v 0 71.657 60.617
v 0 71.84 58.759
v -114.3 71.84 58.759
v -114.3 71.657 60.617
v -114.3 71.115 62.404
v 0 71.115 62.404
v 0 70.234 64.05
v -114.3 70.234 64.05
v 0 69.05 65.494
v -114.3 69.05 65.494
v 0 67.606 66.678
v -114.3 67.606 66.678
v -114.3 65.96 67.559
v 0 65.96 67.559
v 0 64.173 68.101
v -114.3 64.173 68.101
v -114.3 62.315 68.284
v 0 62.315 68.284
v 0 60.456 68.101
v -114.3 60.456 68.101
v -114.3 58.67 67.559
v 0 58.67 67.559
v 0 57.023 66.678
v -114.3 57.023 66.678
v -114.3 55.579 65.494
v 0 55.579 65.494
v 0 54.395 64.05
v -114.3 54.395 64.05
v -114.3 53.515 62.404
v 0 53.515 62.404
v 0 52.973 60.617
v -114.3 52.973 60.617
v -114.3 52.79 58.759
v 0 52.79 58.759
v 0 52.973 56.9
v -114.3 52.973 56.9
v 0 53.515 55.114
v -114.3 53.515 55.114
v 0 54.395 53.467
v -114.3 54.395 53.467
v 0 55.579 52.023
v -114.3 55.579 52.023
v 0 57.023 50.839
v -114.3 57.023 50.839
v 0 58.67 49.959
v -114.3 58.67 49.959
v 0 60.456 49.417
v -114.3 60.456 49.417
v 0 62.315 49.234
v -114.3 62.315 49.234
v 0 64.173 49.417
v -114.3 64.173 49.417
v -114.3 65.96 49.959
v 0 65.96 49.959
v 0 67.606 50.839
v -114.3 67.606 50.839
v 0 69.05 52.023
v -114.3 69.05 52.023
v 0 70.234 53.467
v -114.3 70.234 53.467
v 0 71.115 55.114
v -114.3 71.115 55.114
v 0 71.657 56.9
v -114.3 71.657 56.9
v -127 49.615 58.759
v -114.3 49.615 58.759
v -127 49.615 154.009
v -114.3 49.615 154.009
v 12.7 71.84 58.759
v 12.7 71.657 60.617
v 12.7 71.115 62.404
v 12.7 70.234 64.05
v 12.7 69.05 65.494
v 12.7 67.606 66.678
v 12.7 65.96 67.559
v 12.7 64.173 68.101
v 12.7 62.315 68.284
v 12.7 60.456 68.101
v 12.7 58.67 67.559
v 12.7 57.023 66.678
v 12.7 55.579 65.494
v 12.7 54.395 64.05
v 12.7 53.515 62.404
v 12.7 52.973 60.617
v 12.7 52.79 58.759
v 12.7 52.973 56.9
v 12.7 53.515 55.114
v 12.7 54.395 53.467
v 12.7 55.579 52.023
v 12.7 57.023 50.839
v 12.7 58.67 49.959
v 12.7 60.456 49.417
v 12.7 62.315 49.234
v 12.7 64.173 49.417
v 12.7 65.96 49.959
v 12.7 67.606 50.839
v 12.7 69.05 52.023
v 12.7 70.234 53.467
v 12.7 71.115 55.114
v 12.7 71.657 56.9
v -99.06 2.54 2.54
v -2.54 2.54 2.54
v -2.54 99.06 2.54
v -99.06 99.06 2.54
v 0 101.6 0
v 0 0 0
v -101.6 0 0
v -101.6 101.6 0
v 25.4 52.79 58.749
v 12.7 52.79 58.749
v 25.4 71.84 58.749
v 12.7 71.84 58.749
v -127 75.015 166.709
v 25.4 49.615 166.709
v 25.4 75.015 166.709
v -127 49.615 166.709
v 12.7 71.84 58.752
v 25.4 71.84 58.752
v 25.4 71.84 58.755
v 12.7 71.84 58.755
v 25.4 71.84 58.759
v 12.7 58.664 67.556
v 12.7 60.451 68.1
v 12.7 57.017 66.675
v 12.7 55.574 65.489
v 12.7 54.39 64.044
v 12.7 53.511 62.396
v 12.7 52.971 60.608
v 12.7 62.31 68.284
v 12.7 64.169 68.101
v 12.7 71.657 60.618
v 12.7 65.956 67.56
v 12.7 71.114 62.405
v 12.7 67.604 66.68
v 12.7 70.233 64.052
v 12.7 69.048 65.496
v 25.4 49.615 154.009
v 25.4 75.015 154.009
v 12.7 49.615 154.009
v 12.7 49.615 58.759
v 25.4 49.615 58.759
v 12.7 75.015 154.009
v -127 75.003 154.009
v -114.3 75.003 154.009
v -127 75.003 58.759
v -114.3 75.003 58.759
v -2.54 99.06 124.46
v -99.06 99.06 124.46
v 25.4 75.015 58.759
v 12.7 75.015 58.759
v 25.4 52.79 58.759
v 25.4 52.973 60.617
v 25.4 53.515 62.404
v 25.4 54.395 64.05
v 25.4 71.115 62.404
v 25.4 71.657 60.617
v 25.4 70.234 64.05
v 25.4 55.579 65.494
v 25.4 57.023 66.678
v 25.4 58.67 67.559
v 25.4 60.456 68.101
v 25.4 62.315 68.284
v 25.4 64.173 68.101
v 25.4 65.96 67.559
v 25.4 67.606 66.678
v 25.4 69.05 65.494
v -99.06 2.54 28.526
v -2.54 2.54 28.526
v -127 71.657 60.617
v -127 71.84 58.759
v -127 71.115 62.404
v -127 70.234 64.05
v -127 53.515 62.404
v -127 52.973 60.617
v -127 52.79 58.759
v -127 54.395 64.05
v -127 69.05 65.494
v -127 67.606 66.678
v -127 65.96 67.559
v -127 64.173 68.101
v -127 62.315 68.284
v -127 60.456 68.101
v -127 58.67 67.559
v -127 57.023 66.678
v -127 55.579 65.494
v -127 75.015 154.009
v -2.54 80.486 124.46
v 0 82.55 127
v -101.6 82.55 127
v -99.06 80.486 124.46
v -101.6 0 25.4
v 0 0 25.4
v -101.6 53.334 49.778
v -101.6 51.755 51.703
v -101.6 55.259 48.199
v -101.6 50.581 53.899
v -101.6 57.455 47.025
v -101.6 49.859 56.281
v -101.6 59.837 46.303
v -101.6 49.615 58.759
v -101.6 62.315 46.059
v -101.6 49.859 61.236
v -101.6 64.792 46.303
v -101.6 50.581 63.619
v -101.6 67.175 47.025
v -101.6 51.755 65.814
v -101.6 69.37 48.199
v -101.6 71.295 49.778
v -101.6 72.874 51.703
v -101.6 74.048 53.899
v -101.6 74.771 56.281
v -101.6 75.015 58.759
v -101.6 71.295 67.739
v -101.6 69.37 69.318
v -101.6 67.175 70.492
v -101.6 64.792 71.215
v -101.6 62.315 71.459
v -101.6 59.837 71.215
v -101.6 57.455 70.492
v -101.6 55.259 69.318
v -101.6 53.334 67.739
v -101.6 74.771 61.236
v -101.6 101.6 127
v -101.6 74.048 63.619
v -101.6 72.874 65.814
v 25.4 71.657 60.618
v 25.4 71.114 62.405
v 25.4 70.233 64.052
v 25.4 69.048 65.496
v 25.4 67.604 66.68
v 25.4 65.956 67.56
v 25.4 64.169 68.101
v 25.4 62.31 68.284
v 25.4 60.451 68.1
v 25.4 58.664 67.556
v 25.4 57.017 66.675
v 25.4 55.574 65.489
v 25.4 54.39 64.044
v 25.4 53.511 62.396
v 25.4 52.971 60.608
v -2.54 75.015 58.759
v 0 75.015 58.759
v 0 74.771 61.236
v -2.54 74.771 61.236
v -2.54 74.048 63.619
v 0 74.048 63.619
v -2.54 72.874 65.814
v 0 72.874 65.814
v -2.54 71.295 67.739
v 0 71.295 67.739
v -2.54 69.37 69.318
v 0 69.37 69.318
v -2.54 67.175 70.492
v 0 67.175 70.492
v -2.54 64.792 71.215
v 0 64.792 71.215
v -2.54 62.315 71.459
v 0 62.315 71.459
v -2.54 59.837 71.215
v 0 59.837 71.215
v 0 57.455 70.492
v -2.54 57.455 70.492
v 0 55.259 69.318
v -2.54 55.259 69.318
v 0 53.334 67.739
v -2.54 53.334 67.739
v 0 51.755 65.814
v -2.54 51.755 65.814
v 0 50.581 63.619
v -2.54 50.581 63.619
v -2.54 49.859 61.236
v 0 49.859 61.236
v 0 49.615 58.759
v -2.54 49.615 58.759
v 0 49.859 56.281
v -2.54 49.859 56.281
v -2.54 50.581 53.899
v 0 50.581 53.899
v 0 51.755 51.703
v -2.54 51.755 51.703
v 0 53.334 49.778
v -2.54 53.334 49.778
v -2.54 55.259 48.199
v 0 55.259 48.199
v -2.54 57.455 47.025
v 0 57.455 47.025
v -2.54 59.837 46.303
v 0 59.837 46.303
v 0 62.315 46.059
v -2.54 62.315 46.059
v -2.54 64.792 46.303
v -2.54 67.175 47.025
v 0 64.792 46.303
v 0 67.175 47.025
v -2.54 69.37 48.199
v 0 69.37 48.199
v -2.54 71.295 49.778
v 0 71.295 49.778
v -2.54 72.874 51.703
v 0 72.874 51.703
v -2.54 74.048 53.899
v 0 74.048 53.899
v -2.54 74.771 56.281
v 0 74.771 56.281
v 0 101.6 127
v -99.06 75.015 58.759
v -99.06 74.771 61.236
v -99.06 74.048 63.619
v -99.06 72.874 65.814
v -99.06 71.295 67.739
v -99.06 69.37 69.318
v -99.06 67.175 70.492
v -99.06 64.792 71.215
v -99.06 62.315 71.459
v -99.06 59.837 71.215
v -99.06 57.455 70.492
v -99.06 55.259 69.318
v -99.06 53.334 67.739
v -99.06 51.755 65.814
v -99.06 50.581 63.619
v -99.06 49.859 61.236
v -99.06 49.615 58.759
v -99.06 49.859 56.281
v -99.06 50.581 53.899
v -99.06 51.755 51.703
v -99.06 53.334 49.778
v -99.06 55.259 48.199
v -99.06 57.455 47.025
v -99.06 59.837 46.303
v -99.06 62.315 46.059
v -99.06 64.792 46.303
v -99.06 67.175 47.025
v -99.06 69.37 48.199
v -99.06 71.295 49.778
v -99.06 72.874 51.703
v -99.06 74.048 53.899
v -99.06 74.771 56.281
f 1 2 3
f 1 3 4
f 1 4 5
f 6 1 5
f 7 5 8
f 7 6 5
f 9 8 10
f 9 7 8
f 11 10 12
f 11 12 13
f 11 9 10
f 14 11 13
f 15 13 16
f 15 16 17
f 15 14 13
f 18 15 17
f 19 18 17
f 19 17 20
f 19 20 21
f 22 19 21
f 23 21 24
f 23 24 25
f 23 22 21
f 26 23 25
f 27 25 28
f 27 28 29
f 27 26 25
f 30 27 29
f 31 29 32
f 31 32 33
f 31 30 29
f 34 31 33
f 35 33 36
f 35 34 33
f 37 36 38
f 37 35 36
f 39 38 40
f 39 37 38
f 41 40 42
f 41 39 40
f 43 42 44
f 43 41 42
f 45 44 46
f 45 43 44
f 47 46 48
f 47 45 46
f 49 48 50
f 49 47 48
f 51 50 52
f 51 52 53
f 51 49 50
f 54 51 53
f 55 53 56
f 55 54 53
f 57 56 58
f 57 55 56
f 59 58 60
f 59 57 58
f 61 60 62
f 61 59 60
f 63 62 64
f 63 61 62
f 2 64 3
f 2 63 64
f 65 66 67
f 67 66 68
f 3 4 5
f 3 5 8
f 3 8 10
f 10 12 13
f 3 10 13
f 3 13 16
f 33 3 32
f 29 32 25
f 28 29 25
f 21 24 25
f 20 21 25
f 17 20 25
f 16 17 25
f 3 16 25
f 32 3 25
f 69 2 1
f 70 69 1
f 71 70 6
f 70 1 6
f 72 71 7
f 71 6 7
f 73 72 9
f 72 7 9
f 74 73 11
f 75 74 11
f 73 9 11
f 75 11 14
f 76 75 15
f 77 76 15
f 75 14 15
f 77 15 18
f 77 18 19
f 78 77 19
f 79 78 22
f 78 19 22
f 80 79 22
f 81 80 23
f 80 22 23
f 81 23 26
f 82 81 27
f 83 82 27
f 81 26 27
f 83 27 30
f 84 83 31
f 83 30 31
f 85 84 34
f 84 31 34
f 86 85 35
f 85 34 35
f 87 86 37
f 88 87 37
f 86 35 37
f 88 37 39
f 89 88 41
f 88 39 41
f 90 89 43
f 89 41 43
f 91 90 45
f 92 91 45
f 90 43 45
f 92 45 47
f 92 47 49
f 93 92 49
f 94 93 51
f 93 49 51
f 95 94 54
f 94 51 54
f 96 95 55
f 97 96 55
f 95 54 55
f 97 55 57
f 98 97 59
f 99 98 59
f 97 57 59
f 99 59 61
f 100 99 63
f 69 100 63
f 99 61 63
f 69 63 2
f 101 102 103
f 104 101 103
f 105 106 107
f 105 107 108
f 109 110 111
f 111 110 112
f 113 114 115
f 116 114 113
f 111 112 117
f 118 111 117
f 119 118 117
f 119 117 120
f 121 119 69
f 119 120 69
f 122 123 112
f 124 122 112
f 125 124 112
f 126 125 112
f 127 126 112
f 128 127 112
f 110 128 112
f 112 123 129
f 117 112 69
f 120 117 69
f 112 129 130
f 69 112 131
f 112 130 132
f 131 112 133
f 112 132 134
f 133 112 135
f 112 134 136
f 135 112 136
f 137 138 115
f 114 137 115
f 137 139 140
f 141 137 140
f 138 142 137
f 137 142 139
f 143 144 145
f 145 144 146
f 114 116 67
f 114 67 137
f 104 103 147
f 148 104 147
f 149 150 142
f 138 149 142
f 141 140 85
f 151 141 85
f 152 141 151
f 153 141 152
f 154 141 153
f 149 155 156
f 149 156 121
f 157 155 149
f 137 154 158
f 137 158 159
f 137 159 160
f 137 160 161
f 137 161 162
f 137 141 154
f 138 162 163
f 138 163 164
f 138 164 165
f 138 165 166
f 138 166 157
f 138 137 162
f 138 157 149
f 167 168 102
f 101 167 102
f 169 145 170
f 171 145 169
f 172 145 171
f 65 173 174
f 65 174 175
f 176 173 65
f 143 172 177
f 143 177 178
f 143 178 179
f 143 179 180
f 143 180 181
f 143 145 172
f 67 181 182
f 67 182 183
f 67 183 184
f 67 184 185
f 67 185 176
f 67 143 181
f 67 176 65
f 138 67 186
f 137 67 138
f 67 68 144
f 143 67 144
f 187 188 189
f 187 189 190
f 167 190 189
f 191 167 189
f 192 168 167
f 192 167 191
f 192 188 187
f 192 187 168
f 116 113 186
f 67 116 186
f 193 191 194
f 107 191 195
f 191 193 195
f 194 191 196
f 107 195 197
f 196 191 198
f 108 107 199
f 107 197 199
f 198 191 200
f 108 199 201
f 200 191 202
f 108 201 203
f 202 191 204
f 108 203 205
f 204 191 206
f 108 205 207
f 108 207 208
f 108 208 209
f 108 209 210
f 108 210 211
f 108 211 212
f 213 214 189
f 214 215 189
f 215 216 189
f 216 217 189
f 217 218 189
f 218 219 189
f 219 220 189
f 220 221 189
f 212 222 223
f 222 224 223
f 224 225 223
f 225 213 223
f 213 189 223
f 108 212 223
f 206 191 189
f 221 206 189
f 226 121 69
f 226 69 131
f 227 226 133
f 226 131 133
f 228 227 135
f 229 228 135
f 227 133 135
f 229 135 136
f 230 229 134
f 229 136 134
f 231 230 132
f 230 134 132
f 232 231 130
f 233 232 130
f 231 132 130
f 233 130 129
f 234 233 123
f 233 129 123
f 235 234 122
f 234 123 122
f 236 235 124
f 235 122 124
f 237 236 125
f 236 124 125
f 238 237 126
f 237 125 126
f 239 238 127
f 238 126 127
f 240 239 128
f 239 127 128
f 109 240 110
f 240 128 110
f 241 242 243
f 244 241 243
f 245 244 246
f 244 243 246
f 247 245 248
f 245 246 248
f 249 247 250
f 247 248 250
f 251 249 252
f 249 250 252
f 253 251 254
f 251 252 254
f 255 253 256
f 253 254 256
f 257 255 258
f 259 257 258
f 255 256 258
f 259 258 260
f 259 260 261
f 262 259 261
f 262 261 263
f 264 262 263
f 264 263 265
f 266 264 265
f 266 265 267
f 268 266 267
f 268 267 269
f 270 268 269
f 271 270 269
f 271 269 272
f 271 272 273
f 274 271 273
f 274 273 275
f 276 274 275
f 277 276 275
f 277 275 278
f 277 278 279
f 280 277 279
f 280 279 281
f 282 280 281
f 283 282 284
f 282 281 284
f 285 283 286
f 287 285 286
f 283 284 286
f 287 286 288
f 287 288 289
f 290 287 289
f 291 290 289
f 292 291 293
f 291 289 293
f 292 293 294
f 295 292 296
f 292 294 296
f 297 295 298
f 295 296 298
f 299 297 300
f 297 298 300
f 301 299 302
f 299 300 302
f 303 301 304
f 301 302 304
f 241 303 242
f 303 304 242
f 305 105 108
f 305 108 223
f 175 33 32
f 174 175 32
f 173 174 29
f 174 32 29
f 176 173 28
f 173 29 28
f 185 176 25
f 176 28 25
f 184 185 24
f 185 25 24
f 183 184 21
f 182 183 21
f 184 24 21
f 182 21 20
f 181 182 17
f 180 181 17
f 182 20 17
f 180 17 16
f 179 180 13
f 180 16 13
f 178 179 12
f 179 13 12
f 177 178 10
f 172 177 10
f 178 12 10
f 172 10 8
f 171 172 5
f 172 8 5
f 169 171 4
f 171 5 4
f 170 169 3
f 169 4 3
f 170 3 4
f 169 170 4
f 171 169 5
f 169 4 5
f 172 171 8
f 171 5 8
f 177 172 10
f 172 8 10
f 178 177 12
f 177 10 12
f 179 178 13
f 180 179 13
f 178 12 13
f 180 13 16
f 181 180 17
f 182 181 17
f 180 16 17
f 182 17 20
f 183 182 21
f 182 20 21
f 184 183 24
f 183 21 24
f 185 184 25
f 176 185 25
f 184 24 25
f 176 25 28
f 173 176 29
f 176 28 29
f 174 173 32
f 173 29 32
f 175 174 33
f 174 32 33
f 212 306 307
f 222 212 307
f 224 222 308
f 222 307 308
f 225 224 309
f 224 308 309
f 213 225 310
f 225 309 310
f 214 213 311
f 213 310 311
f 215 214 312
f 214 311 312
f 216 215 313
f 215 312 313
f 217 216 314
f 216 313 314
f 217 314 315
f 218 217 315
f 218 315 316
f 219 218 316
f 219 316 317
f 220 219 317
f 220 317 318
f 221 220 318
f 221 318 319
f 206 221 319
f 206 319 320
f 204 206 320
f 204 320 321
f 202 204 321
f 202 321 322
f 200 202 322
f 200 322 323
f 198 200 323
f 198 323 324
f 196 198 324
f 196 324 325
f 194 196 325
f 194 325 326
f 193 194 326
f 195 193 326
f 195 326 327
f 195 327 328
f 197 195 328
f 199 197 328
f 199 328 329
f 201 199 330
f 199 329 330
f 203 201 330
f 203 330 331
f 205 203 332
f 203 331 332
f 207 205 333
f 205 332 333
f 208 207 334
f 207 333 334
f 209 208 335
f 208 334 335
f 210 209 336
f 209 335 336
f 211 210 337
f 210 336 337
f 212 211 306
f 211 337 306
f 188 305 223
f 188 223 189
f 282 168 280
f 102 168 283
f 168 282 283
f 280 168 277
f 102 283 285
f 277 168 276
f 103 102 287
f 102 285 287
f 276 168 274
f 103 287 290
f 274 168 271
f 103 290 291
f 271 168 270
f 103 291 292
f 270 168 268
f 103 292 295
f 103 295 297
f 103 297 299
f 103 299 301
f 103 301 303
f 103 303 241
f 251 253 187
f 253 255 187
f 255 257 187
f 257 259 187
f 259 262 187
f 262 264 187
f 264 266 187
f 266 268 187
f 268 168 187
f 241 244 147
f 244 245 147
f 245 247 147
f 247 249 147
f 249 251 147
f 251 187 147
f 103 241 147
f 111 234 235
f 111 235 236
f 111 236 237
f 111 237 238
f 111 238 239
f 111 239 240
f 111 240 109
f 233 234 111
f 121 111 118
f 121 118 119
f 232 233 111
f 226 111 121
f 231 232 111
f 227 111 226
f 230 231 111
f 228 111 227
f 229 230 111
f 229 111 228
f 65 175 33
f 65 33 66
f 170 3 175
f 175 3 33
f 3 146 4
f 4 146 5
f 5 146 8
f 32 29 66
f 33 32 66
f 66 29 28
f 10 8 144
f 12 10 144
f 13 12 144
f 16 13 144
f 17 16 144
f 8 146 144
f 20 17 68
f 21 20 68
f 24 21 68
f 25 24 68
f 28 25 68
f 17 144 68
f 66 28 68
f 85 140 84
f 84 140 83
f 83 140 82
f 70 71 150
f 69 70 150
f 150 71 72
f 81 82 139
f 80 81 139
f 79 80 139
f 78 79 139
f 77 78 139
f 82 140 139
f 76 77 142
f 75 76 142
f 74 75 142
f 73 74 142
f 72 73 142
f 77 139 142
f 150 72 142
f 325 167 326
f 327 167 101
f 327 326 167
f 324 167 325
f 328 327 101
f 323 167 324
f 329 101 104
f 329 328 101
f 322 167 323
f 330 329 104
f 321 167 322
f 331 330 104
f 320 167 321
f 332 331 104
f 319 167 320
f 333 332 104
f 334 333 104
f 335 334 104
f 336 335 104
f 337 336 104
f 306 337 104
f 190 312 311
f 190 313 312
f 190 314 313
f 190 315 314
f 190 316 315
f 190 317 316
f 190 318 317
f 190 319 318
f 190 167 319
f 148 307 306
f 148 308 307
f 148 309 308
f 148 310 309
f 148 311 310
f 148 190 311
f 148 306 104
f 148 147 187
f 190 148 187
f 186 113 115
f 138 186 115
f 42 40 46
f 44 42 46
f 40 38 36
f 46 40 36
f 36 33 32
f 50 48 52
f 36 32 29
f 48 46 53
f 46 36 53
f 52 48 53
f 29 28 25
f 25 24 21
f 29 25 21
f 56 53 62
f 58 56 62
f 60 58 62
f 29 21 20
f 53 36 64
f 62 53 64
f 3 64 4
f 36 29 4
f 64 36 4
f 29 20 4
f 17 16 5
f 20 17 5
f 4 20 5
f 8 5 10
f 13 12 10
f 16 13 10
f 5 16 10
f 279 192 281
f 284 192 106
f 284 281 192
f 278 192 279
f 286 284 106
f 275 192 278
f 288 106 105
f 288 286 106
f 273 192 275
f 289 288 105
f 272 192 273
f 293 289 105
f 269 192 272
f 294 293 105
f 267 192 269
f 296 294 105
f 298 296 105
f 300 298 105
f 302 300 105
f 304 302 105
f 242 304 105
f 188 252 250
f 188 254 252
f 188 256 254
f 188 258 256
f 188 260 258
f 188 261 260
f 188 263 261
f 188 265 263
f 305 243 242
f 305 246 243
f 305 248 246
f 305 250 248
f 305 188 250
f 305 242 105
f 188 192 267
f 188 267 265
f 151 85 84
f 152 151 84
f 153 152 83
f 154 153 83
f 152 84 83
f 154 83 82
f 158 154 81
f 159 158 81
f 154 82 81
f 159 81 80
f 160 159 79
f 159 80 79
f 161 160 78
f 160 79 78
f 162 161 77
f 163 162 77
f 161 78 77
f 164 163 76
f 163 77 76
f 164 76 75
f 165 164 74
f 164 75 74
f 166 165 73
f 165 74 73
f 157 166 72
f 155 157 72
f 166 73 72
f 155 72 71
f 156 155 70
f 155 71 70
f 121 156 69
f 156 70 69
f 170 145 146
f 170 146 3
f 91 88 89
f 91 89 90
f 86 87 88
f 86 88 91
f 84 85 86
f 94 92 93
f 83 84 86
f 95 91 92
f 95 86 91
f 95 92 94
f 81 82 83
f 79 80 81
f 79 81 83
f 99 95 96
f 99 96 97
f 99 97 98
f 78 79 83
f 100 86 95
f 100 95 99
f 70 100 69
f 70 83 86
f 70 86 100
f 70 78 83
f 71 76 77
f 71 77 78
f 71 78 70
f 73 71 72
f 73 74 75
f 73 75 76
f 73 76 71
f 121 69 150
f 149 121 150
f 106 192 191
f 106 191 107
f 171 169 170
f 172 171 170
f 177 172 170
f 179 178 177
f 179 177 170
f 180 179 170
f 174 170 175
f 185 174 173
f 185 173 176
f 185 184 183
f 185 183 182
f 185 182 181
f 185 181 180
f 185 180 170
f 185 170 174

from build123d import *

# Parameters (mm, degrees)
F1_DEPTH  = 101.6
F2_T      = -2.54
F3_R      = 12.7
F4_DEPTH  = 101.6
F5_R      = 9.525
F6_DEPTH  = 114.3
F7_DEPTH  = 12.7
F9_DEPTH  = 12.7
F11_DEPTH = 12.7
F13_DEPTH = 12.7
F15_DEPTH = 12.7
F17_DEPTH = 25.4


with BuildPart() as f1:
    # F0 (on Right) → F1 (new body)
    with BuildSketch(Plane.YZ):
        Polygon((0, 25.4), (0, 0), (101.6, 0), (101.6, 127), (82.55, 127), align=None)
    extrude(amount=-F1_DEPTH)

    # F2
    f2_openings = [f1.faces().sort_by_distance(p)[0] for p in [
        (-50.8, 41.275, 76.2),
    ]]
    offset(amount=F2_T, openings=f2_openings)

    # F3 (on face) → F4 (cut)
    with BuildSketch(Plane.YZ):
        with Locations((62.3146630824, 58.7586686015)):
            Circle(F3_R)
    extrude(amount=-F4_DEPTH, mode=Mode.SUBTRACT)


with BuildPart() as f6:
    # F5 (on face) → F6 (new body)
    with BuildSketch(Plane.YZ):
        with Locations((62.3146630824, 58.7586686015)):
            Circle(F5_R)
    extrude(amount=-F6_DEPTH)

    # F7 (add): a face of the model
    f7_faces = [f6.faces().sort_by_distance(p)[0] for p in [
        (0, 62.3146630824, 58.7586686015),
    ]]
    extrude(f7_faces, amount=F7_DEPTH)


with BuildPart() as f9:
    # F8 (on face) → F9 (new body)
    with BuildSketch(Plane.YZ.offset(12.7)):
        with BuildLine():
            ThreePointArc((52.7896630824, 58.7586686015), (62.3146630824, 68.2836686015), (71.8396630824, 58.7586686015))
            Line((71.8396630824, 58.7586686015), (75.0146630824, 58.7586686015))
            Line((75.0146630824, 58.7586686015), (75.0146630824, 154.0086686015))
            Line((75.0146630824, 154.0086686015), (49.6146630824, 154.0086686015))
            Line((49.6146630824, 154.0086686015), (49.6146630824, 58.7586686015))
            Line((49.6146630824, 58.7586686015), (52.7896630824, 58.7586686015))
        make_face()
    extrude(amount=F9_DEPTH)


with BuildPart() as f11:
    # F10 (on face) → F11 (new body)
    with BuildSketch(Plane.YZ.offset(12.7)):
        with BuildLine():
            ThreePointArc((71.8396630824, 58.7586686015), (62.3096746028, 68.2836672952), (52.7896683075, 58.7486916438))
            Line((52.7896683075, 58.7486916438), (71.8396578572, 58.7486916438))
            ThreePointArc((71.8396578572, 58.7486916438), (71.8396617761, 58.7536801219), (71.8396630824, 58.7586686015))
        make_face()
    extrude(amount=F11_DEPTH)


with BuildPart() as f13:
    # F12 (on face) → F13 (new body)
    with BuildSketch(Plane(origin=(-114.3, 0, 0), x_dir=(0, -1, 0), z_dir=(-1, 0, 0))):
        with BuildLine():
            ThreePointArc((-71.8396630824, 58.7586686015), (-62.3146630824, 68.2836686015), (-52.7896630824, 58.7586686015))
            Line((-52.7896630824, 58.7586686015), (-49.6146630824, 58.7586686015))
            Line((-49.6146630824, 58.7586686015), (-49.6146630824, 154.0086686015))
            Line((-49.6146630824, 154.0086686015), (-75.003027916, 154.0086686015))
            Line((-75.003027916, 154.0086686015), (-75.003027916, 58.7586686015))
            Line((-75.003027916, 58.7586686015), (-71.8396630824, 58.7586686015))
        make_face()
    extrude(amount=F13_DEPTH)


with BuildPart() as f15:
    # F14 (on face) → F15 (new body)
    with BuildSketch(Plane(origin=(-114.3, 0, 0), x_dir=(0, -1, 0), z_dir=(-1, 0, 0))):
        with BuildLine():
            Line((-71.8396630824, 58.7586686015), (-62.3146630824, 58.7586686015))
            Line((-62.3146630824, 58.7586686015), (-52.7896630824, 58.7586686015))
            ThreePointArc((-52.7896630824, 58.7586686015), (-62.3146630824, 68.2836686015), (-71.8396630824, 58.7586686015))
        make_face()
    extrude(amount=F15_DEPTH)


with BuildPart() as f17:
    # F16 (on face) → F17 (new body)
    with BuildSketch(Plane.XZ.offset(-49.6146630824)):
        Polygon((-127, 166.7086686015), (-127, 154.0086686015), (-114.3, 154.0086686015), (25.4, 154.0086686015), (25.4, 166.7086686015), align=None)
    extrude(amount=-F17_DEPTH)


solid = Compound([f1.part, f6.part, f9.part, f11.part, f13.part, f15.part, f17.part])
